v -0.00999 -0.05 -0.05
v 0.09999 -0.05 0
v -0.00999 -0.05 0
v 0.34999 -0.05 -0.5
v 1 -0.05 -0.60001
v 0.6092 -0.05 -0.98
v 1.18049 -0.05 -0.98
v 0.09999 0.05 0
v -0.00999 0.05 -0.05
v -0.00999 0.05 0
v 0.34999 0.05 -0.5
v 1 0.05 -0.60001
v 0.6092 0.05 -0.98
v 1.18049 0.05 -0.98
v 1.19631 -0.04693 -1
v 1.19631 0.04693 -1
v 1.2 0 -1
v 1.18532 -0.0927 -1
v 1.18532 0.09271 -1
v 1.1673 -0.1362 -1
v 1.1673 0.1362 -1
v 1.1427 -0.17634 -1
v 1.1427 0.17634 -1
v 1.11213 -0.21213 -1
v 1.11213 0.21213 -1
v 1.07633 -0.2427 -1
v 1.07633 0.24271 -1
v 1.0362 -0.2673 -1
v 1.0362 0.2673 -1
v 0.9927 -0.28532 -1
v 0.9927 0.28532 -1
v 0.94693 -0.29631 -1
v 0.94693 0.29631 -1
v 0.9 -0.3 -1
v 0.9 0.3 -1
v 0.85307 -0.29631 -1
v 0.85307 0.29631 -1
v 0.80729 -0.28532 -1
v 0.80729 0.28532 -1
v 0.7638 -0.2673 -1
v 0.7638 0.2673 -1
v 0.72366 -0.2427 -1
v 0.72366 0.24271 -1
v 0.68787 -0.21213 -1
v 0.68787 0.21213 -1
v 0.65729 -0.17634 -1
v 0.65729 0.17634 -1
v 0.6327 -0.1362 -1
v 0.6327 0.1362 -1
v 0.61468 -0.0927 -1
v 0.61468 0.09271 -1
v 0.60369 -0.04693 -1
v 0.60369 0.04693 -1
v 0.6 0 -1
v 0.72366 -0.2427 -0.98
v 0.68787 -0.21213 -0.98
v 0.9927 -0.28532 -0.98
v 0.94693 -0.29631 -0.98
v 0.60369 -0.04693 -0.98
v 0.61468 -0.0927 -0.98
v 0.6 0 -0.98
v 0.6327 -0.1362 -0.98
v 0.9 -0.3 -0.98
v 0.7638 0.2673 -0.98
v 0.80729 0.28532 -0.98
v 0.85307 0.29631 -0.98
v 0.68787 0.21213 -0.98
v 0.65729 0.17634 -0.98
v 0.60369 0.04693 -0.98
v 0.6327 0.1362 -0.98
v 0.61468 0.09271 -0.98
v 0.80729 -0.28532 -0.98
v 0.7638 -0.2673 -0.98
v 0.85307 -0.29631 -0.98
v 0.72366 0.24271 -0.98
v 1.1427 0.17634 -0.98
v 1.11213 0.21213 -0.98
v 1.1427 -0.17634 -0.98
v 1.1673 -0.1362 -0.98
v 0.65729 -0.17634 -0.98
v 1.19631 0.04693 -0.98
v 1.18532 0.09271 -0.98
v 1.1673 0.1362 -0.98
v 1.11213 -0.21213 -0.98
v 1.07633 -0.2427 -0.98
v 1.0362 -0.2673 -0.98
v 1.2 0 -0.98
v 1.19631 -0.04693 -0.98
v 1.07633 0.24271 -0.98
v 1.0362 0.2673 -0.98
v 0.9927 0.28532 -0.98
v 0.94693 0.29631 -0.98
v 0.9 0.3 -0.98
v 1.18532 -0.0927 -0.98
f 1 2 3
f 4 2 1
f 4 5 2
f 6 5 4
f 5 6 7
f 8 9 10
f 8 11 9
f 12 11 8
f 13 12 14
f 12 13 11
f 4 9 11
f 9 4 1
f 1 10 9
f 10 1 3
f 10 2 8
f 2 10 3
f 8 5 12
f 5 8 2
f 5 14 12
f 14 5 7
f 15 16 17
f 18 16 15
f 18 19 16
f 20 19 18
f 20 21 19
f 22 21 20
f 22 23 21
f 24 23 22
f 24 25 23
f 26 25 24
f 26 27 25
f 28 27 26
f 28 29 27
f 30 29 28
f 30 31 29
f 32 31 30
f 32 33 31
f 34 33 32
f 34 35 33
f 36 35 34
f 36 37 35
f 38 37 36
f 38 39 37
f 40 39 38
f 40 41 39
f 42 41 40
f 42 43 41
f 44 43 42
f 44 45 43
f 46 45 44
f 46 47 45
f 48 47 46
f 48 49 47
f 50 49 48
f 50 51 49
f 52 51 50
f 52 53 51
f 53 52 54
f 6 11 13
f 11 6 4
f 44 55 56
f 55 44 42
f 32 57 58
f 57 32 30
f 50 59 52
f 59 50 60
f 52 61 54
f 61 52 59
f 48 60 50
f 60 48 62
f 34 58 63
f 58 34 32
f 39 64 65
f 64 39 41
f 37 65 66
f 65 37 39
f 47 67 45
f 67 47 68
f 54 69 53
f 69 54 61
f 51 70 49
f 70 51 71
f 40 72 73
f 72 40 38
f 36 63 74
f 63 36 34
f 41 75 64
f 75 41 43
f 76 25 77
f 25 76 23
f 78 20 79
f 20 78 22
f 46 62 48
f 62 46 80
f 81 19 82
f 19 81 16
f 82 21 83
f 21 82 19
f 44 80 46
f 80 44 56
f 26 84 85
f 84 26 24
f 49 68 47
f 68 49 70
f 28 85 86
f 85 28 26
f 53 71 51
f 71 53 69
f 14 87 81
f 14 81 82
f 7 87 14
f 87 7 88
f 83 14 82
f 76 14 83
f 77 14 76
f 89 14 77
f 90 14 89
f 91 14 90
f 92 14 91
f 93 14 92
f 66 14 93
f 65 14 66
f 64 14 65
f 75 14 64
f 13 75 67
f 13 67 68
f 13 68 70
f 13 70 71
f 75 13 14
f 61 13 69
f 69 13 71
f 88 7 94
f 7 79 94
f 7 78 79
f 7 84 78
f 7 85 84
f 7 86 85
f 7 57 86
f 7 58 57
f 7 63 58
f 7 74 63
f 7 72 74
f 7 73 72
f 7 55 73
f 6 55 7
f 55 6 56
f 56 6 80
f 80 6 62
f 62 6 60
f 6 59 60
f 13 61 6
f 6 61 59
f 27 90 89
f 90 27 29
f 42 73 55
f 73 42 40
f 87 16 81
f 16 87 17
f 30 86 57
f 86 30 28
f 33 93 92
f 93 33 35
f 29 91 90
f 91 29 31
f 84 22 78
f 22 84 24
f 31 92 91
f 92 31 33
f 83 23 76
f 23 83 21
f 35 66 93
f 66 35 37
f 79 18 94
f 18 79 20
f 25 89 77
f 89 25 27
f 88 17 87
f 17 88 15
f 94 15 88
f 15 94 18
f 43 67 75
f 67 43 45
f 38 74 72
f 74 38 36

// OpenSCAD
//----------------------------------------------
// Arch buttress Support Style
// Size must be 1mm height 
//----------------------------------------------
$fn=40;

rotate([0,0,180]) translate([-0.5,-0.5,-1.0]) 
union() {
    translate([0.5,0.55,0.0]) rotate([90, 0, 0]) {
			linear_extrude(height=0.1) {
				polygon(points=[[-0.62,0],[-1.19,0],[-1,0.4],[-0.1,1],[0.01,1],[0.01,0.95],[-0.35,0.5]], convexity=1);
			}
		}
    translate([-0.4,0.5,0.0]) cylinder ( h = 0.02, r = 0.3, center = false);
    // translate([-0.65,0.5,0.0]) cylinder ( h = 0.02, r = 0.12, center = false);
    // translate([-0.15,0.5,0.0]) cylinder ( h = 0.02, r = 0.12, center = false);
    // translate([-0.4,0.5,0.01]) cube(size = [0.50,0.24,0.02] , center = true);    
}
